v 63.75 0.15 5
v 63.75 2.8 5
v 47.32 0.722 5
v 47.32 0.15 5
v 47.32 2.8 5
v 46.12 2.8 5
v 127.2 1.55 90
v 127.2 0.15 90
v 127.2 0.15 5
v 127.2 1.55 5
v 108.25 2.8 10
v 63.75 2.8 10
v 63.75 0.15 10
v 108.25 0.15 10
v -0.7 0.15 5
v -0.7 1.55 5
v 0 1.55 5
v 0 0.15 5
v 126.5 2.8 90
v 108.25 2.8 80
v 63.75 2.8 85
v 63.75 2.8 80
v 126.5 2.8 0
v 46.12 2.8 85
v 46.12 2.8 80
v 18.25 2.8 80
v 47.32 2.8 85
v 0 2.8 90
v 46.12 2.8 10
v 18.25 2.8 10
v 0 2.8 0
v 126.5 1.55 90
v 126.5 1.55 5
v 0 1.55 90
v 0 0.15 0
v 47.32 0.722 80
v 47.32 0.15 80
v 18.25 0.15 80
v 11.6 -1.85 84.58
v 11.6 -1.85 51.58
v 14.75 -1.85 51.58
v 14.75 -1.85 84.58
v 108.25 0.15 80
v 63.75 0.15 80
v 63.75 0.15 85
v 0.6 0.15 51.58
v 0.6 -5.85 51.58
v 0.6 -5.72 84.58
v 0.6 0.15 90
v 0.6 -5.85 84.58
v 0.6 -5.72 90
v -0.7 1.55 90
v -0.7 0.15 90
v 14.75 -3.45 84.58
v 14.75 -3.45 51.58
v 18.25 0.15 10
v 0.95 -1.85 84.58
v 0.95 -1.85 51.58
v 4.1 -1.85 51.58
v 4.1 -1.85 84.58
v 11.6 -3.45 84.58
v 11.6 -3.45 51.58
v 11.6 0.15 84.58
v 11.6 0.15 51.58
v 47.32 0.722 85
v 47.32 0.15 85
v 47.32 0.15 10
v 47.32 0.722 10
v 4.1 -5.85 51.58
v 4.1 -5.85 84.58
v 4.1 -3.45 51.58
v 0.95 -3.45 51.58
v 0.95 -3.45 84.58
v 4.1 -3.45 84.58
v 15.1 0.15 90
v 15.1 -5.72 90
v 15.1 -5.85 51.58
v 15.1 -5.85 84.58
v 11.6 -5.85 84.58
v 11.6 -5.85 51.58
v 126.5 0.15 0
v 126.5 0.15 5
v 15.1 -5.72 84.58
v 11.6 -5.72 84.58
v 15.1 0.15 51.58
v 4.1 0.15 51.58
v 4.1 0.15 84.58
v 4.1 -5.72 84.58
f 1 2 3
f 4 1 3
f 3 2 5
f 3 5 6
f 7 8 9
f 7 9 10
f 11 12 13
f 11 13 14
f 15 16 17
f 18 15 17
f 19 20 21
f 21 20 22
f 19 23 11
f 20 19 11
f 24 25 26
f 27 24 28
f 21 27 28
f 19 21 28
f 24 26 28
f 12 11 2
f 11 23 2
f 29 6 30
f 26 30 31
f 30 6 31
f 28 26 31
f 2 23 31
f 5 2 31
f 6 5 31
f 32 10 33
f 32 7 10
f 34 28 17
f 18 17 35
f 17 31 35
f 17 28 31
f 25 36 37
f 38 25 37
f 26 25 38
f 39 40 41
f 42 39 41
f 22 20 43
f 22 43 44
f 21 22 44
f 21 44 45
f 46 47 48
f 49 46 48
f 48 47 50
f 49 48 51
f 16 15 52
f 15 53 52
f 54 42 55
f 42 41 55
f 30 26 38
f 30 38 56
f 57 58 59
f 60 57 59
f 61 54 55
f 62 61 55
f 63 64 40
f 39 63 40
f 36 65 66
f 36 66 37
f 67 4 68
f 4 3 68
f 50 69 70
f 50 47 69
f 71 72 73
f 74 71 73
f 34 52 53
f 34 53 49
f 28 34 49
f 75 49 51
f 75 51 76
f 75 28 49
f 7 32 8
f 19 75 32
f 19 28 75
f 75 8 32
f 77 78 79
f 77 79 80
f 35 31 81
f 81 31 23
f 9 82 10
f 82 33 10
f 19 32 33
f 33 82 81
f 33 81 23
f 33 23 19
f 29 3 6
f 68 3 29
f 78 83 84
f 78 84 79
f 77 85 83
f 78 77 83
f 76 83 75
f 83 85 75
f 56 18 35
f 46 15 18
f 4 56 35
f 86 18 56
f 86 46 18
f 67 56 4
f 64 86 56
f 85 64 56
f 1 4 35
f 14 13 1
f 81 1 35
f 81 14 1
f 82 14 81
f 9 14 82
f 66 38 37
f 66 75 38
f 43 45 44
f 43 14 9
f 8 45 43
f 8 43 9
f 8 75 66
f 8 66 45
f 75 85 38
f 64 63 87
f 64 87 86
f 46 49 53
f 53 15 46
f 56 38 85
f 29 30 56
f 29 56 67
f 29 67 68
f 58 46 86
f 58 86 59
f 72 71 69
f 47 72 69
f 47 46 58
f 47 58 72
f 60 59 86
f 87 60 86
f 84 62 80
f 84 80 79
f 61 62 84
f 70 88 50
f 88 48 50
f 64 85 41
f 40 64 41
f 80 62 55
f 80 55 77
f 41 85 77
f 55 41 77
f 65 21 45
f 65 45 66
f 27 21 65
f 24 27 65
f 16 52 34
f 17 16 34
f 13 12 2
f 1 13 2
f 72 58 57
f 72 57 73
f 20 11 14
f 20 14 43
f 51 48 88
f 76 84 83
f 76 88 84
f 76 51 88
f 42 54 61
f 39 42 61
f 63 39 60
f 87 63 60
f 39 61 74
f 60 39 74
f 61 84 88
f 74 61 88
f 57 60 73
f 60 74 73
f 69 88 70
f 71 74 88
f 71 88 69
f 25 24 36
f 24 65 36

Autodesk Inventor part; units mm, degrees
ref_plane "YZ Plane" through (0, 0, 0) normal (1, 0, 0) x (0, 1, 0)
ref_plane "XZ Plane" through (0, 0, 0) normal (0, 1, 0) x (-1, 0, 0)
ref_plane "XY Plane" through (0, 0, 0) normal (0, 0, 1) x (1, 0, 0)
sketch "Sketch1" plane through (0, 0, 0) normal (0, 0, 1) x (1, 0, 0)
  line L0 (0, 0) -> (126.5, 0)
  line L1 (126.5, 0) -> (126.5, 2.8)
  line L2 (126.5, 2.8) -> (0, 2.8)
  line L3 (0, 2.8) -> (0, 0)
  dimension "d0" = 126.5
  dimension "d1" = 2.8
extrude "Extrusion1" add sketch "Sketch1" along normal blind 90
sketch "Sketch2" plane through (0, 0, 90) normal (0, 0, 1) x (1, 0, 0)
  line L0 (126.5, 0) -> (126.5, 2.8) projected
  line L1 (0, 2.8) -> (0, 0) projected
  line L2 (126.5, 0.15) -> (127.2, 0.15)
  line L3 (127.2, 0.15) -> (127.2, 1.55)
  line L4 (127.2, 1.55) -> (126.5, 1.55)
  line L5 (126.5, 1.55) -> (126.5, 0.15)
  line L6 (0, 0.15) -> (-0.7, 0.15)
  line L7 (-0.7, 0.15) -> (-0.7, 1.55)
  line L8 (-0.7, 1.55) -> (0, 1.55)
  line L9 (0, 1.55) -> (0, 0.15)
  line L10 (126.5, 2.8) -> (0, 2.8) projected
  dimension "d4" = 0.7
  dimension "d5" = 1.4
  dimension "d6" = 0.7
  dimension "d7" = 1.4
  dimension "d17" = 1.25
  dimension "d18" = 1.25
extrude "Extrusion2" add sketch "Sketch2" against normal blind 85
sketch "Sketch3" plane through (0, 0, 0) normal (0, -1, 0) x (1, 0, 0)
  line L0 (0, 90) -> (126.5, 90) projected
  line L1 (0, 0) -> (0, 90) projected
  line L2 (0.6, 90) -> (15.1, 90)
  line L3 (15.1, 90) -> (15.1, 84.58)
  line L4 (15.1, 84.58) -> (0.6, 84.58)
  line L5 (0.6, 84.58) -> (0.6, 90)
  dimension "d12" = 14.5
  dimension "d13" = 5.42
  dimension "d14" = 0.6
extrude "Extrusion3" add sketch "Sketch3" along normal blind 5.72
sketch "Sketch4" plane through (0, 0, 0) normal (0, -1, 0) x (1, 0, 0)
  line L0 (15.1, 90) -> (15.1, 84.58) projected
  line L1 (15.1, 84.58) -> (0.6, 84.58) projected
  line L2 (0.6, 84.58) -> (0.6, 90) projected
  line L3 (0, 90) -> (0.6, 90) projected
  line L4 (0, 0) -> (0, 90) projected
  line L5 (0, 0) -> (126.5, 0) projected
  line L6 (126.5, 0) -> (126.5, 90) projected
  line L7 (15.1, 90) -> (126.5, 90) projected
extrude "Extrusion4" cut sketch "Sketch4" against normal blind 0.15
sketch "Sketch5" plane through (0, 0.15, 0) normal (0, -1, 0) x (1, 0, 0)
  line L0 (0.6, 84.58) -> (15.1, 84.58) projected
  line L1 (0.6, 84.58) -> (2.6, 84.58)
  line L2 (2.6, 84.58) -> (2.6, 51.58)
  line L3 (2.6, 51.58) -> (0.6, 51.58)
  line L4 (0.6, 51.58) -> (0.6, 84.58)
  line L5 (15.1, 84.58) -> (13.1, 84.58)
  line L6 (13.1, 84.58) -> (13.1, 51.58)
  line L7 (13.1, 51.58) -> (15.1, 51.58)
  line L8 (15.1, 51.58) -> (15.1, 84.58)
  dimension "d21" = 33
  dimension "d22" = 2
  dimension "d23" = 2
  dimension "d24" = 10.5
extrude "Extrusion5" add sketch "Sketch5" along normal blind 6
sketch "Sketch6" plane through (2.6, 0.15, 51.58) normal (0, 0, -1) x (-1, 0, 0)
  line L0 (0, 0) -> (0, -6) projected
  line L1 (2, -6) -> (0, -6) projected
  line L2 (0, -2) -> (-1.5, -2)
  line L3 (-1.5, -2) -> (-1.5, 0)
  line L4 (-1.5, 0) -> (0, 0)
  line L5 (0, 0) -> (0, -2)
  point P0 (2.6, -0.15)
  dimension "d27" = 4
  dimension "d28" = 2
  dimension "d29" = 1.5
extrude "Extrusion6" add sketch "Sketch6" against normal blind 33
sketch "Sketch7" plane through (2.6, -5.85, 51.58) normal (0, 0, -1) x (-1, 0, 0)
  line L0 (0, 4) -> (1.65, 4)
  line L1 (1.65, 4) -> (1.65, 2.4)
  line L2 (1.65, 2.4) -> (0, 2.4)
  line L3 (0, 2.4) -> (0, 4)
  point P0 (2.6, 5.85)
  dimension "d32" = 1.65
  dimension "d33" = 1.6
extrude "Extrusion7" cut sketch "Sketch7" against normal blind 33
sketch "Sketch8" plane through (15.1, 0.15, 51.58) normal (0, 0, -1) x (-1, 0, 0)
  line L0 (2, 0) -> (3.5, 0)
  line L1 (3.5, 0) -> (3.5, -2)
  line L2 (3.5, -2) -> (2, -2)
  line L3 (2, -2) -> (2, 0)
  point P0 (15.1, -0.15)
  dimension "d36" = 1.5
  dimension "d37" = 2
extrude "Extrusion8" add sketch "Sketch8" against normal blind 33
sketch "Sketch9" plane through (15.1, -5.85, 51.58) normal (0, 0, -1) x (-1, 0, 0)
  line L0 (2, 4) -> (0.35, 4)
  line L1 (0.35, 4) -> (0.35, 2.4)
  line L2 (0.35, 2.4) -> (2, 2.4)
  line L3 (2, 2.4) -> (2, 4)
  point P0 (15.1, 5.85)
  dimension "d40" = 1.65
  dimension "d41" = 1.6
extrude "Extrusion9" cut sketch "Sketch9" against normal blind 33
sketch "Sketch10" plane through (13.1, -5.85, 51.58) normal (-1, 0, 0) x (0, 0, 1)
  line L0 (33, 2.4) -> (0, 2.4) projected
  line L1 (0, 2.4) -> (0, 0) projected
  line L2 (33, 0) -> (0, 0) projected
  line L3 (33, 0.13) -> (33, 0) projected
  line L4 (33, 2.4) -> (33, 0.13) projected
  point P0 (-51.58, 5.85)
extrude "Extrusion10" add sketch "Sketch10" along normal blind 1.5
sketch "Sketch11" plane through (2.6, -5.85, 84.58) normal (1, 0, 0) x (0, 0, -1)
  line L0 (33, 2.4) -> (0, 2.4) projected
  line L1 (0, 0.13) -> (0, 2.4) projected
  line L2 (0, 0.13) -> (0, 0) projected
  line L3 (33, 0) -> (0, 0) projected
  line L4 (33, 2.4) -> (33, 0) projected
  point P0 (84.58, 5.85)
extrude "Extrusion11" add sketch "Sketch11" along normal blind 1.5
sketch "Sketch12" plane through (0, 2.8, 0) normal (0, 1, 0) x (1, 0, 0)
  line L0 (18.25, -10) -> (108.25, -10)
  line L1 (108.25, -10) -> (108.25, -80)
  line L2 (108.25, -80) -> (18.25, -80)
  line L3 (18.25, -80) -> (18.25, -10)
  line L4 (126.5, 0) -> (0, 0) projected
  line L5 (0, 0) -> (0, -90) projected
  line L6 (126.5, -90) -> (0, -90) projected
  line L7 (126.5, 0) -> (126.5, -90) projected
  line L8 (47.32, -80) -> (63.75, -80)
  line L9 (63.75, -80) -> (63.75, -85)
  line L10 (63.75, -85) -> (47.32, -85)
  line L11 (47.32, -85) -> (47.32, -80)
  line L12 (47.32, -10) -> (63.75, -10)
  line L13 (63.75, -10) -> (63.75, -5)
  line L14 (63.75, -5) -> (47.32, -5)
  line L15 (47.32, -5) -> (47.32, -10)
  dimension "d51" = 90
  dimension "d52" = 70
  dimension "d55" = 18.25
  dimension "d56" = 18.25
  dimension "d57" = 10
  dimension "d58" = 10
  dimension "d59" = 16.43
  dimension "d60" = 5
  dimension "d61" = 29.07
  dimension "d67" = 5
  dimension "d68" = 29.07
extrude "Extrusion13" cut sketch "Sketch12" against normal up to next contours L0 L1 L2 L3 | L15 L14 L13 L0 | L2 L9 L10 L11
chamfer "Chamfer1" distance 1.2 angle 60 1 edges at (47.32, 2.8, 82.5) measured on face at (6.0833, 2.8, 56.6667)
chamfer "Chamfer2" distance 1.2 angle 60 1 edges at (47.32, 2.8, 7.5) measured on face at (6.0833, 2.8, 56.6667)
properties part number "Bovenplaat Frame 2.3"
